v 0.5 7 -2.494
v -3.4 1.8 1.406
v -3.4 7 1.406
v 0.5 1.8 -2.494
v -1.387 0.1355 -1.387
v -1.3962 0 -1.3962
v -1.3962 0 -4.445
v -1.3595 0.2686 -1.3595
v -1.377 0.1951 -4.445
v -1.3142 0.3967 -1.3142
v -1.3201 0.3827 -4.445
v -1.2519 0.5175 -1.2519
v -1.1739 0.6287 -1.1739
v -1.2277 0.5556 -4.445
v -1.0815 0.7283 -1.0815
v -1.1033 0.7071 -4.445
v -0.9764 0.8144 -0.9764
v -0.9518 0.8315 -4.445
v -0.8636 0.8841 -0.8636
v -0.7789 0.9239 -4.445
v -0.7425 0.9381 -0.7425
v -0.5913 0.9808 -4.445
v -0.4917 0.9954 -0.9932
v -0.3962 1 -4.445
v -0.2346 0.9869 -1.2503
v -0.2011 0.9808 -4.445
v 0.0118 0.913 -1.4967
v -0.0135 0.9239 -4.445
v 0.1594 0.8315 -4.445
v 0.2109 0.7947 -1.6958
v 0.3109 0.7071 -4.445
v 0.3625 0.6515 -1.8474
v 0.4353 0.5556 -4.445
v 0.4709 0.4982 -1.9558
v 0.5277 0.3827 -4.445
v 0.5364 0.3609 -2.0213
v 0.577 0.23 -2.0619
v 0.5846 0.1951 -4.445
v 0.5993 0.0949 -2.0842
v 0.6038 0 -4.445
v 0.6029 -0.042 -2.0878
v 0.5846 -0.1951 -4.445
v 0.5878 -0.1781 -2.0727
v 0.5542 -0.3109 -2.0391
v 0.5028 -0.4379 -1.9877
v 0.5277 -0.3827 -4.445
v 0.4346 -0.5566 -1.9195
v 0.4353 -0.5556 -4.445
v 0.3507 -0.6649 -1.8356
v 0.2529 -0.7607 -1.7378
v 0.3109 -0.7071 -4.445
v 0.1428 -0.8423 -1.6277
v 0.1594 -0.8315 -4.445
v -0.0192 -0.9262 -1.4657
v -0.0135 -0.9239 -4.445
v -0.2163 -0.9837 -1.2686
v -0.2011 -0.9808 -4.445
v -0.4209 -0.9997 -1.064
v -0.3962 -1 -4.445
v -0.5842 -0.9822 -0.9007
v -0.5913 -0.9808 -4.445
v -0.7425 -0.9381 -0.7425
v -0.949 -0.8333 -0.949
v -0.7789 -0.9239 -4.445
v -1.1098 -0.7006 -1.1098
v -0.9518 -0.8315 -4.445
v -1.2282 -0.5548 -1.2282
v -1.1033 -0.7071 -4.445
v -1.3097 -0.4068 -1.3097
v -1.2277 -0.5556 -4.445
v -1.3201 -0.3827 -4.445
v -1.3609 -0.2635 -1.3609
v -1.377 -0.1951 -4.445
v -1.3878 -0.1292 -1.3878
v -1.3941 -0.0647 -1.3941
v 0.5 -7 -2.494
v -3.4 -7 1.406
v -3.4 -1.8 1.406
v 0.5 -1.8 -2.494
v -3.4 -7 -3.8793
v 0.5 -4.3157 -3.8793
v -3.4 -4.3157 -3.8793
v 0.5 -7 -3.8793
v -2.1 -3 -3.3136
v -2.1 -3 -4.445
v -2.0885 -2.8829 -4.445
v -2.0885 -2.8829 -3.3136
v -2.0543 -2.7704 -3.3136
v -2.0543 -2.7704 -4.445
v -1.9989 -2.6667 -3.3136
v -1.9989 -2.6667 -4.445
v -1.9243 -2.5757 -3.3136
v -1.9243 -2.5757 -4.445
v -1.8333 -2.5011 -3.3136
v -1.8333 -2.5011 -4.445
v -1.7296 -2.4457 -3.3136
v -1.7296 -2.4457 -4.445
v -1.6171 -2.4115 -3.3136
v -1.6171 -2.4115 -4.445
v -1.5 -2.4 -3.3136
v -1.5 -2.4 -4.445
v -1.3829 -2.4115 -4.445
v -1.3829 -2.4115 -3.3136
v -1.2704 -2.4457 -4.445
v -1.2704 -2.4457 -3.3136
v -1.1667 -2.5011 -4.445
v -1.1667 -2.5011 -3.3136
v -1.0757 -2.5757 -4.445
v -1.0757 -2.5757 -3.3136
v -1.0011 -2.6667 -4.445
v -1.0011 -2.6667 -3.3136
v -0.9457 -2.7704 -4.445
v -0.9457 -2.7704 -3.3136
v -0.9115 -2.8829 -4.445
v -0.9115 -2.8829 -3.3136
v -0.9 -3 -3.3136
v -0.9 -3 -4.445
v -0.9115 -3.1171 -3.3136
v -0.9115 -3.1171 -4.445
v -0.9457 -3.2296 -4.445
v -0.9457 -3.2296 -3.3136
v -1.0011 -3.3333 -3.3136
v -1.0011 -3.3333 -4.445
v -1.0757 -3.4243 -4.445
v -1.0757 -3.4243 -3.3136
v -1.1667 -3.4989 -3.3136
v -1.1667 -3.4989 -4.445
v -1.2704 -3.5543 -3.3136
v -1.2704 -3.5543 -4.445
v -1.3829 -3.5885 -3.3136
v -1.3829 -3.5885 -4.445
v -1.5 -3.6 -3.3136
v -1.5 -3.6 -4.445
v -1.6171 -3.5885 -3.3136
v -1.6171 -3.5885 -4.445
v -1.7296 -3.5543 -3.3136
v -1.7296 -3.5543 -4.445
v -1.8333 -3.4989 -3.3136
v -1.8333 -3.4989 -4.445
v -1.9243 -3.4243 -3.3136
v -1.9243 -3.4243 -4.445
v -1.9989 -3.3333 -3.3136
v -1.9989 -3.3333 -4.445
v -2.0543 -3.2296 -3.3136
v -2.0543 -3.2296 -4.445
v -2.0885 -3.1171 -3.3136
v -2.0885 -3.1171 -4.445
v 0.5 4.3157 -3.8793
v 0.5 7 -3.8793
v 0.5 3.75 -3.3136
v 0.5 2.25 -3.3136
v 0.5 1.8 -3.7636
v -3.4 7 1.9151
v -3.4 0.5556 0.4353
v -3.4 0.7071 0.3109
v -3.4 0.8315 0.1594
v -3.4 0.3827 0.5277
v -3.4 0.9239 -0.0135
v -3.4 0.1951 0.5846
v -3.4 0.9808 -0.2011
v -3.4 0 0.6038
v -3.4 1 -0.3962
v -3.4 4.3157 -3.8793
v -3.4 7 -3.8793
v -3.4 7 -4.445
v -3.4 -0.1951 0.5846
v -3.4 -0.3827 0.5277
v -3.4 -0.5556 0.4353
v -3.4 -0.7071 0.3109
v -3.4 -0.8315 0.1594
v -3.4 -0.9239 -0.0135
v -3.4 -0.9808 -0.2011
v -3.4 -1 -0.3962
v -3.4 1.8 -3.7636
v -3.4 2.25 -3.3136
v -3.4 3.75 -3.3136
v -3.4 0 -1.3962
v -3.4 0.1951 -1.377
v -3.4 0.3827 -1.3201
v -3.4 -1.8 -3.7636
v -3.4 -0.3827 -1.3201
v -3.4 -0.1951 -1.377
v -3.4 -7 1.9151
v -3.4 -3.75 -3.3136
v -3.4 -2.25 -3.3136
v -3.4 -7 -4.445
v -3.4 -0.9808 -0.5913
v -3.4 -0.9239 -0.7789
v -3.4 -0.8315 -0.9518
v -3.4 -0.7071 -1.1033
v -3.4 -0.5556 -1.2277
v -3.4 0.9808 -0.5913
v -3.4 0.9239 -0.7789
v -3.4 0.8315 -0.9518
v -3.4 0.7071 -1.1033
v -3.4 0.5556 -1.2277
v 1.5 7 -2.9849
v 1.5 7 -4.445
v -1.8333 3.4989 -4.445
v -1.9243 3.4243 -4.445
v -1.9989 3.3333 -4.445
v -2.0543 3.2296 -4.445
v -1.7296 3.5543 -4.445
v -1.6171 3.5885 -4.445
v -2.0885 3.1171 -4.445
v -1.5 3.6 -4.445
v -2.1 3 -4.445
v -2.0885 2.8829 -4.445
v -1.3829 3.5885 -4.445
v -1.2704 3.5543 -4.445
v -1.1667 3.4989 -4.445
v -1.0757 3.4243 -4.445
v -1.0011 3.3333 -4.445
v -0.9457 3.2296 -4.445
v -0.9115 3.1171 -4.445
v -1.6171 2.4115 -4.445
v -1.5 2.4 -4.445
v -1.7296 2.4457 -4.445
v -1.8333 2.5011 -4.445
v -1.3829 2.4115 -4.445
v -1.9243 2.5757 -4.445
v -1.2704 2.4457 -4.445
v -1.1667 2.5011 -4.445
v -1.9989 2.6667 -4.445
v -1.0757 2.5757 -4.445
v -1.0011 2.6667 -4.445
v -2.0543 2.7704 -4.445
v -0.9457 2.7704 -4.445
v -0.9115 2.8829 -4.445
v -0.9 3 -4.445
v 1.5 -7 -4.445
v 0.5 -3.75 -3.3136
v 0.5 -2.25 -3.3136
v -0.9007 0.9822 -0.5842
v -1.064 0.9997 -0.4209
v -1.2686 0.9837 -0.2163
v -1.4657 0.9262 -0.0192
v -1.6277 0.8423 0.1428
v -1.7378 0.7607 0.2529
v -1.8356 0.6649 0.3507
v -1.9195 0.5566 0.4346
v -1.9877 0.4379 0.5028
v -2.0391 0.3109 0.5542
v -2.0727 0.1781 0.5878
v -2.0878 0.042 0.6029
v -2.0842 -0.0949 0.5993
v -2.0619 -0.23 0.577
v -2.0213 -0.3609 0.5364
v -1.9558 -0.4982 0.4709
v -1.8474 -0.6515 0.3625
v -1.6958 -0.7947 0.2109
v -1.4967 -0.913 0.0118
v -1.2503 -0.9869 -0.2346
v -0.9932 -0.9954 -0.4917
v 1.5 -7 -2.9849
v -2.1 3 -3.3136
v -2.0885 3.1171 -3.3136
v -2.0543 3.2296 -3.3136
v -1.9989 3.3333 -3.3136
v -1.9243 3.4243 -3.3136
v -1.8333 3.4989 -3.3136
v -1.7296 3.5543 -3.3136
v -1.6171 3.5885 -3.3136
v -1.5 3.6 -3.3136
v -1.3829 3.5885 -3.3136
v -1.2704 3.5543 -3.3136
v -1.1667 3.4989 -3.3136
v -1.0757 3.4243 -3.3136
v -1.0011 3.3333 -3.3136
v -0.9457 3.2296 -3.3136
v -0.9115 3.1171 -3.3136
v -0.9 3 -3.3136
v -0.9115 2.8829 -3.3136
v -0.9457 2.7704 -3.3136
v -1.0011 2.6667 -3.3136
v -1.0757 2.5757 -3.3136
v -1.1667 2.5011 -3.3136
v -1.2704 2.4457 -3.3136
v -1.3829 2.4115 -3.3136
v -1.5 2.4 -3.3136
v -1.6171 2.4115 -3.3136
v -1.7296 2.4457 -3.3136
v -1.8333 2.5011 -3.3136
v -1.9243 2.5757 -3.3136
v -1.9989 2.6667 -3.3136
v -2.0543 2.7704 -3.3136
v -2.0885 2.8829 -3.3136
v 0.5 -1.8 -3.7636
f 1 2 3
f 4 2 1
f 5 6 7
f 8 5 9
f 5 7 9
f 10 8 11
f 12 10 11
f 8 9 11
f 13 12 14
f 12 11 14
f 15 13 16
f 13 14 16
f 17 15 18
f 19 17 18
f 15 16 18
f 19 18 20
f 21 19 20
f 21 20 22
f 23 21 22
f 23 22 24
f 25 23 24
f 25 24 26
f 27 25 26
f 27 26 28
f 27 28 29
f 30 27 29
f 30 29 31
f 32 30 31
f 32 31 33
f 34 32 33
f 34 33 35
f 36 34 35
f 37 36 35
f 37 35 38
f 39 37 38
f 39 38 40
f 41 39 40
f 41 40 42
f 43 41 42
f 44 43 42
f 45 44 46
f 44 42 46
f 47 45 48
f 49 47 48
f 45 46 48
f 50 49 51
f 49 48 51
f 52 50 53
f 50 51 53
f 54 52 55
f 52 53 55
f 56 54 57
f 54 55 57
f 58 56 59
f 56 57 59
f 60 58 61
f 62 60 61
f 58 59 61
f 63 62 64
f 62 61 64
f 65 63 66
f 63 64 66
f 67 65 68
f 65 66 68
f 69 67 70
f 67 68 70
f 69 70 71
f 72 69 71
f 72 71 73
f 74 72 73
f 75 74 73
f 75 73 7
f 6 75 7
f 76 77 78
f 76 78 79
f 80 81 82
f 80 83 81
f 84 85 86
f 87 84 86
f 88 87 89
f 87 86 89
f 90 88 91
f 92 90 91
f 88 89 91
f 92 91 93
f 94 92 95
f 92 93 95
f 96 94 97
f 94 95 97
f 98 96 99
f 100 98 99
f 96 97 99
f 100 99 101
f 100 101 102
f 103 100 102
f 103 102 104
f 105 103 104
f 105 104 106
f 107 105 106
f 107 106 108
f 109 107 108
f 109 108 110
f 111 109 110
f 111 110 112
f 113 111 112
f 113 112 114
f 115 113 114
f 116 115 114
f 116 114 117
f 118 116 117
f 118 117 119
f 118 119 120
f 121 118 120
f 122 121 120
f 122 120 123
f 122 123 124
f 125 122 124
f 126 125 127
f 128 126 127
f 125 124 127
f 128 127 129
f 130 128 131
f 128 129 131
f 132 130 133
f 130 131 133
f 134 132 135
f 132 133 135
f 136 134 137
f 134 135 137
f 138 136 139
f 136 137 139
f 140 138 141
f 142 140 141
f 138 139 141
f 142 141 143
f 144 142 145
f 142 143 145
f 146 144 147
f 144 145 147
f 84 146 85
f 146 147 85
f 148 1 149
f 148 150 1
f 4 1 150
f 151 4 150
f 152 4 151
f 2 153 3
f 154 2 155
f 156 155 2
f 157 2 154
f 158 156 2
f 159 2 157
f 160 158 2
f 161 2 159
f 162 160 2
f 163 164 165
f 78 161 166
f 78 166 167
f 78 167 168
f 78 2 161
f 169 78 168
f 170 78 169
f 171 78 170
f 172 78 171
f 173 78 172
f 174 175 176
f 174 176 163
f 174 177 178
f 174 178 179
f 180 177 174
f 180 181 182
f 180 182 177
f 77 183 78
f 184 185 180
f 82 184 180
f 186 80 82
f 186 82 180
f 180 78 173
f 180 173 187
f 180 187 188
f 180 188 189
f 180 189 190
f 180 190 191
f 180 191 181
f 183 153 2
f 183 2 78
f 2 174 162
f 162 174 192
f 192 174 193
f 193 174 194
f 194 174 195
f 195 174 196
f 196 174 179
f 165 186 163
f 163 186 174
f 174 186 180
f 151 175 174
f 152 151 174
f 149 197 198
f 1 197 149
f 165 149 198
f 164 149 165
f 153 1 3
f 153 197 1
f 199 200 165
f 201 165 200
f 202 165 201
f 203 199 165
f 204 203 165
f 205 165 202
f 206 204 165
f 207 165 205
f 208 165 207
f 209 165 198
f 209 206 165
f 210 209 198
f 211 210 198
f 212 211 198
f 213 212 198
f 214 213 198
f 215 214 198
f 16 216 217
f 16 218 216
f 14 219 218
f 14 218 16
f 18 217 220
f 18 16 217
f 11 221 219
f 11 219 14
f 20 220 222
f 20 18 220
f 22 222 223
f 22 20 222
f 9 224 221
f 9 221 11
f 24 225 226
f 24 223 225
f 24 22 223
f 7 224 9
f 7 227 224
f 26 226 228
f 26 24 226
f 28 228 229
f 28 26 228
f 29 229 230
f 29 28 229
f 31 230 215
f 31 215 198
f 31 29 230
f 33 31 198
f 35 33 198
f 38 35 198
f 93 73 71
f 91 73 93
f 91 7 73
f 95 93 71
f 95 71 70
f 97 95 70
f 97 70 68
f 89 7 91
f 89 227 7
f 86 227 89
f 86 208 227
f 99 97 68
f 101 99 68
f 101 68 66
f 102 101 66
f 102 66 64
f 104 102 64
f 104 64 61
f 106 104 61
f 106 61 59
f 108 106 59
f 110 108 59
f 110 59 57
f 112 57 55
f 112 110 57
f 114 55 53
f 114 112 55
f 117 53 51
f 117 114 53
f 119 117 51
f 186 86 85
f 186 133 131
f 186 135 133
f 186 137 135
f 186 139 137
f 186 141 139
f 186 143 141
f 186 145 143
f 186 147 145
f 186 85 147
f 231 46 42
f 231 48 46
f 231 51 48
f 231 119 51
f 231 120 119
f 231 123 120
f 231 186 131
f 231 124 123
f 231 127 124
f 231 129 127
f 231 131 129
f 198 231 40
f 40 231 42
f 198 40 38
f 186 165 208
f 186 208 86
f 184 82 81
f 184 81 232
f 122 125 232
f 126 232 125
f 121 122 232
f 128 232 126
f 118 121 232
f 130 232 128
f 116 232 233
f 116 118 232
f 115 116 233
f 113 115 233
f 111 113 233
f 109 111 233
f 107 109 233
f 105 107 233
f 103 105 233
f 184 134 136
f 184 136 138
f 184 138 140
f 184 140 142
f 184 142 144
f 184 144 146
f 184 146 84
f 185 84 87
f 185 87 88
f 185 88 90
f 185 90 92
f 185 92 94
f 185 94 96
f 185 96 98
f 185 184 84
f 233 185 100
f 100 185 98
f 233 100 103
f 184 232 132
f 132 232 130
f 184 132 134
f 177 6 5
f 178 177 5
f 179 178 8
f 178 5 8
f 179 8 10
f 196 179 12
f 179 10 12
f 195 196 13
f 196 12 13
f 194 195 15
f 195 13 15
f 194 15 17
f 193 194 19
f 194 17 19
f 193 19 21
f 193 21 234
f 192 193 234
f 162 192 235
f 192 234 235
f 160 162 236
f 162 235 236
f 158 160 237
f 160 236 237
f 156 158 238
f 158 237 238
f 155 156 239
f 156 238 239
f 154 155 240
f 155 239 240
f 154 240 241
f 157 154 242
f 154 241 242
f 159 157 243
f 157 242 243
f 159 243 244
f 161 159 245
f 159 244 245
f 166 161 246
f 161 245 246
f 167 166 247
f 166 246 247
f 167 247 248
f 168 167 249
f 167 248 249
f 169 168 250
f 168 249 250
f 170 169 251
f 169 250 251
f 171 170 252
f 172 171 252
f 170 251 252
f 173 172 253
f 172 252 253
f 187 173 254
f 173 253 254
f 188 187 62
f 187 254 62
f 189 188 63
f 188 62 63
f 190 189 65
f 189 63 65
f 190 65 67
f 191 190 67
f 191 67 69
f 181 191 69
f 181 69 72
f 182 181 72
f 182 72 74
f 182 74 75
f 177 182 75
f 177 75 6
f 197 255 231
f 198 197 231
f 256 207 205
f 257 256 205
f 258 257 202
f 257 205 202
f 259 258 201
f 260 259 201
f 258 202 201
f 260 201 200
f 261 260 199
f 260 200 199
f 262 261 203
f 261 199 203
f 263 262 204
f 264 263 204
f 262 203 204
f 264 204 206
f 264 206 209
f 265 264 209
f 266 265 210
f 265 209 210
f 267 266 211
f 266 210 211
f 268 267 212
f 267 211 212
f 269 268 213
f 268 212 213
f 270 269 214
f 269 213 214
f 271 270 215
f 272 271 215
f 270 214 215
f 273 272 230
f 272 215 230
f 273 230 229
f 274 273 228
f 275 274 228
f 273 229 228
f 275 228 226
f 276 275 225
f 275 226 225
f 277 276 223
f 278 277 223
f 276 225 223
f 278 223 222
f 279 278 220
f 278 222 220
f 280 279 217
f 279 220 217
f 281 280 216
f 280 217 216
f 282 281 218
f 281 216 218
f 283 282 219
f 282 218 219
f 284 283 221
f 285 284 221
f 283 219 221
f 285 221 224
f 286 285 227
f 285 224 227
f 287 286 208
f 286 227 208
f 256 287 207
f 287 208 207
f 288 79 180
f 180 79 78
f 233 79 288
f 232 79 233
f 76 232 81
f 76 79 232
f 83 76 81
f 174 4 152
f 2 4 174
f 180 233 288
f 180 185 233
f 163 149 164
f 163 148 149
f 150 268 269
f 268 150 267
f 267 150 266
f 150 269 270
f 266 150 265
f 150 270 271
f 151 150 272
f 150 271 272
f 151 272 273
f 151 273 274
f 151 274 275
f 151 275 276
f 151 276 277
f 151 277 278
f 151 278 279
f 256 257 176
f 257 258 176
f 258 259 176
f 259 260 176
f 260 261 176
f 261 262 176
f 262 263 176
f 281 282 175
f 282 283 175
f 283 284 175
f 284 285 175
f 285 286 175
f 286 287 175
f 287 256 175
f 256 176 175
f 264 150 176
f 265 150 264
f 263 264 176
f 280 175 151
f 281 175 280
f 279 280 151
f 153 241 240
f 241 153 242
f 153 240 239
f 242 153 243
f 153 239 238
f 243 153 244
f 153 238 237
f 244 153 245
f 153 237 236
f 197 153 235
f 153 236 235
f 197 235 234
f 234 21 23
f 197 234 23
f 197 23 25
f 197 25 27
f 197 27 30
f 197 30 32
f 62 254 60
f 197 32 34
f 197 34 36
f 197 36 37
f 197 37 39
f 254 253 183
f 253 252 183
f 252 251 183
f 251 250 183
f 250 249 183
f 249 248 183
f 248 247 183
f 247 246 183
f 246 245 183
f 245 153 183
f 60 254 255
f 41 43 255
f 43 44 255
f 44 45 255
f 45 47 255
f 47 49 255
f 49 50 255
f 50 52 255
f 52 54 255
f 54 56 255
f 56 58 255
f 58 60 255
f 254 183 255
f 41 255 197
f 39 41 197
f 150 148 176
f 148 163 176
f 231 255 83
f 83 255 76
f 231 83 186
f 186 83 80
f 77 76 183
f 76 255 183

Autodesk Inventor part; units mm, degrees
ref_plane "YZ Plane" through (0, 0, 0) normal (1, 0, 0) x (0, 1, 0)
ref_plane "XZ Plane" through (0, 0, 0) normal (0, 1, 0) x (-1, 0, 0)
ref_plane "XY Plane" through (0, 0, 0) normal (0, 0, 1) x (1, 0, 0)
sketch "Sketch9" plane through (0, 0, 0) normal (0, 1, 0) x (-1, 0, 0)
  line L0 (3.4, -4.445) -> (-1.5, -4.445)
  line L1 (-0.3017, -1.7866) -> (-1.0442, -1.0442) construction
  line L2 (-1.0442, -1.0442) -> (1.7843, 1.7843) construction
  line L3 (1.7843, 1.7843) -> (2.5267, 1.0418) construction
  line L4 (0, 0) -> (0, 4.9841) construction
  line L5 (0, 0) -> (-5.2239, 0) construction
  line L6 (0, 0) -> (1.0887, -0.3962) construction
  line L7 (1.0887, -0.3962) -> (3.6157, -0.3962) construction
  line L8 (-0.3017, -1.7866) -> (2.5267, 1.0418) construction
  line L9 (3.4, 1.9151) -> (-1.5, -2.9849)
  line L10 (-1.5, -2.9849) -> (-1.5, -4.445)
  line L11 (-0.5, -2.494) -> (-0.5, -3.8793)
  line L12 (-0.5, -3.8793) -> (3.4, -3.8793)
  line L13 (3.4, -3.8793) -> (3.4, -4.445)
  line L14 (3.4, -3.8793) -> (2.8343, -4.445) construction
  line L15 (3.4, 1.9151) -> (3.4, 1.406)
  line L16 (3.4, 1.406) -> (-0.5, -2.494)
  line L17 (0, 0) -> (0.5624, -0.5624) construction
  line L18 (3.4, 1.406) -> (3.4, 0.7133)
  line L19 (3.4, 0.7133) -> (-0.5, -3.1867)
  line L20 (3.4, 0.7133) -> (3.4, -3.8793)
  line L21 (0, 0) -> (0.3962, -1.0887) construction
  dimension "d82" = 1.05
  dimension "d83" = 4.445
  dimension "d84" = 3.4
  dimension "d86" = 4
  dimension "d102" = 135
  dimension "d104" = 1
  dimension "d115" = 45
  dimension "d116" = 0.8
  dimension "d125" = 1.5
  dimension "d126" = 0.36
  dimension "d127" = 25
  dimension "d133" = 25
sketch "Sketch14" plane through (0, 0, 0) normal (0, 1, 0) x (-1, 0, 0)
  line L0 (0, 0) -> (0.3962, -1.0887) construction
  line L1 (0, 0) -> (1.0887, -0.3962) construction
  line L2 (0.3962, 3.3492) -> (1.3962, 3.3492)
  line L3 (1.3962, 3.3492) -> (1.3962, -4.9901)
  line L4 (1.3962, -4.9901) -> (0.3962, -4.9901)
  line L5 (0.3962, -4.9901) -> (0.3962, 3.3492)
  line L6 (-1.8344, -0.3962) -> (3.8418, -0.3962)
  line L7 (3.8418, -0.3962) -> (3.8418, -1.3962)
  line L8 (3.8418, -1.3962) -> (-1.8344, -1.3962)
  line L9 (-1.8344, -1.3962) -> (-1.8344, -0.3962)
  dimension "d134" = 1
extrude "Extrusion14" add sketch "Sketch9" along normal mid plane 14 contours L0 L10 L9 L15 L16 L11 L12 L13
sketch "Sketch13" plane through (-3.4, -7, -3.8793) normal (-1, 0, 0) x (0, 0, 1)
  line L0 (0, 0) -> (0, 14) projected
  line L1 (0, 8.6843) -> (0, 11.3157)
  line L2 (0, 11.3157) -> (0.5657, 10.75)
  line L3 (0.5657, 10.75) -> (0.5657, 9.25)
  line L4 (0.5657, 9.25) -> (0, 8.6843)
  line L5 (0, 7) -> (-0.5657, 7) projected
  line L6 (-0.5657, 14) -> (0, 14) projected
  line L7 (0.5657, 10) -> (0, 10) construction
  line L8 (0, 2.6843) -> (0.5657, 3.25)
  line L9 (0.5657, 3.25) -> (0.5657, 4.75)
  line L10 (0.5657, 4.75) -> (0, 5.3157)
  point P0 (3.8793, 7)
  point P1 (-0.2828, 7)
  dimension "d117" = 45
  dimension "d118" = 3
  dimension "d119" = 1.5
extrude "Extrusion16" add sketch "Sketch13" against normal up to next
sketch "Sketch12" plane through (1.5, 7, -4.445) normal (0, 0, -1) x (-1, 0, 0)
  circle A0 centre (3, -4) radius 0.6
  circle A1 centre (3, -10) radius 0.6
  point P0 (1.5, -7)
  dimension "d109" = 1.5
  dimension "d110" = 3
  dimension "d111" = 3
  dimension "d112" = 1.2
extrude "Extrusion15" cut sketch "Sketch12" against normal blind 2
extrude "Extrusion17" add sketch "Sketch9" along normal mid plane 3.6 contours L12 L11 L19 L20 | L19 L11 L16 L18
revolve "Revolution5" cut sketch "Sketch14" angle 360 about axis through (-0.3962, 0, -4.9901) along (0, 0, 1) contours L2 L3 L6 L5 | L6 L3 L8 L5 | L8 L3 L4 L5
revolve "Revolution6" cut sketch "Sketch14" angle 360 about axis through (1.8344, 0, -0.3962) along (-1, 0, 0) contours L6 L3 L8 L5 | L5 L8 L9 L6 | L6 L7 L8 L3
properties part number "round dichroic holder"
